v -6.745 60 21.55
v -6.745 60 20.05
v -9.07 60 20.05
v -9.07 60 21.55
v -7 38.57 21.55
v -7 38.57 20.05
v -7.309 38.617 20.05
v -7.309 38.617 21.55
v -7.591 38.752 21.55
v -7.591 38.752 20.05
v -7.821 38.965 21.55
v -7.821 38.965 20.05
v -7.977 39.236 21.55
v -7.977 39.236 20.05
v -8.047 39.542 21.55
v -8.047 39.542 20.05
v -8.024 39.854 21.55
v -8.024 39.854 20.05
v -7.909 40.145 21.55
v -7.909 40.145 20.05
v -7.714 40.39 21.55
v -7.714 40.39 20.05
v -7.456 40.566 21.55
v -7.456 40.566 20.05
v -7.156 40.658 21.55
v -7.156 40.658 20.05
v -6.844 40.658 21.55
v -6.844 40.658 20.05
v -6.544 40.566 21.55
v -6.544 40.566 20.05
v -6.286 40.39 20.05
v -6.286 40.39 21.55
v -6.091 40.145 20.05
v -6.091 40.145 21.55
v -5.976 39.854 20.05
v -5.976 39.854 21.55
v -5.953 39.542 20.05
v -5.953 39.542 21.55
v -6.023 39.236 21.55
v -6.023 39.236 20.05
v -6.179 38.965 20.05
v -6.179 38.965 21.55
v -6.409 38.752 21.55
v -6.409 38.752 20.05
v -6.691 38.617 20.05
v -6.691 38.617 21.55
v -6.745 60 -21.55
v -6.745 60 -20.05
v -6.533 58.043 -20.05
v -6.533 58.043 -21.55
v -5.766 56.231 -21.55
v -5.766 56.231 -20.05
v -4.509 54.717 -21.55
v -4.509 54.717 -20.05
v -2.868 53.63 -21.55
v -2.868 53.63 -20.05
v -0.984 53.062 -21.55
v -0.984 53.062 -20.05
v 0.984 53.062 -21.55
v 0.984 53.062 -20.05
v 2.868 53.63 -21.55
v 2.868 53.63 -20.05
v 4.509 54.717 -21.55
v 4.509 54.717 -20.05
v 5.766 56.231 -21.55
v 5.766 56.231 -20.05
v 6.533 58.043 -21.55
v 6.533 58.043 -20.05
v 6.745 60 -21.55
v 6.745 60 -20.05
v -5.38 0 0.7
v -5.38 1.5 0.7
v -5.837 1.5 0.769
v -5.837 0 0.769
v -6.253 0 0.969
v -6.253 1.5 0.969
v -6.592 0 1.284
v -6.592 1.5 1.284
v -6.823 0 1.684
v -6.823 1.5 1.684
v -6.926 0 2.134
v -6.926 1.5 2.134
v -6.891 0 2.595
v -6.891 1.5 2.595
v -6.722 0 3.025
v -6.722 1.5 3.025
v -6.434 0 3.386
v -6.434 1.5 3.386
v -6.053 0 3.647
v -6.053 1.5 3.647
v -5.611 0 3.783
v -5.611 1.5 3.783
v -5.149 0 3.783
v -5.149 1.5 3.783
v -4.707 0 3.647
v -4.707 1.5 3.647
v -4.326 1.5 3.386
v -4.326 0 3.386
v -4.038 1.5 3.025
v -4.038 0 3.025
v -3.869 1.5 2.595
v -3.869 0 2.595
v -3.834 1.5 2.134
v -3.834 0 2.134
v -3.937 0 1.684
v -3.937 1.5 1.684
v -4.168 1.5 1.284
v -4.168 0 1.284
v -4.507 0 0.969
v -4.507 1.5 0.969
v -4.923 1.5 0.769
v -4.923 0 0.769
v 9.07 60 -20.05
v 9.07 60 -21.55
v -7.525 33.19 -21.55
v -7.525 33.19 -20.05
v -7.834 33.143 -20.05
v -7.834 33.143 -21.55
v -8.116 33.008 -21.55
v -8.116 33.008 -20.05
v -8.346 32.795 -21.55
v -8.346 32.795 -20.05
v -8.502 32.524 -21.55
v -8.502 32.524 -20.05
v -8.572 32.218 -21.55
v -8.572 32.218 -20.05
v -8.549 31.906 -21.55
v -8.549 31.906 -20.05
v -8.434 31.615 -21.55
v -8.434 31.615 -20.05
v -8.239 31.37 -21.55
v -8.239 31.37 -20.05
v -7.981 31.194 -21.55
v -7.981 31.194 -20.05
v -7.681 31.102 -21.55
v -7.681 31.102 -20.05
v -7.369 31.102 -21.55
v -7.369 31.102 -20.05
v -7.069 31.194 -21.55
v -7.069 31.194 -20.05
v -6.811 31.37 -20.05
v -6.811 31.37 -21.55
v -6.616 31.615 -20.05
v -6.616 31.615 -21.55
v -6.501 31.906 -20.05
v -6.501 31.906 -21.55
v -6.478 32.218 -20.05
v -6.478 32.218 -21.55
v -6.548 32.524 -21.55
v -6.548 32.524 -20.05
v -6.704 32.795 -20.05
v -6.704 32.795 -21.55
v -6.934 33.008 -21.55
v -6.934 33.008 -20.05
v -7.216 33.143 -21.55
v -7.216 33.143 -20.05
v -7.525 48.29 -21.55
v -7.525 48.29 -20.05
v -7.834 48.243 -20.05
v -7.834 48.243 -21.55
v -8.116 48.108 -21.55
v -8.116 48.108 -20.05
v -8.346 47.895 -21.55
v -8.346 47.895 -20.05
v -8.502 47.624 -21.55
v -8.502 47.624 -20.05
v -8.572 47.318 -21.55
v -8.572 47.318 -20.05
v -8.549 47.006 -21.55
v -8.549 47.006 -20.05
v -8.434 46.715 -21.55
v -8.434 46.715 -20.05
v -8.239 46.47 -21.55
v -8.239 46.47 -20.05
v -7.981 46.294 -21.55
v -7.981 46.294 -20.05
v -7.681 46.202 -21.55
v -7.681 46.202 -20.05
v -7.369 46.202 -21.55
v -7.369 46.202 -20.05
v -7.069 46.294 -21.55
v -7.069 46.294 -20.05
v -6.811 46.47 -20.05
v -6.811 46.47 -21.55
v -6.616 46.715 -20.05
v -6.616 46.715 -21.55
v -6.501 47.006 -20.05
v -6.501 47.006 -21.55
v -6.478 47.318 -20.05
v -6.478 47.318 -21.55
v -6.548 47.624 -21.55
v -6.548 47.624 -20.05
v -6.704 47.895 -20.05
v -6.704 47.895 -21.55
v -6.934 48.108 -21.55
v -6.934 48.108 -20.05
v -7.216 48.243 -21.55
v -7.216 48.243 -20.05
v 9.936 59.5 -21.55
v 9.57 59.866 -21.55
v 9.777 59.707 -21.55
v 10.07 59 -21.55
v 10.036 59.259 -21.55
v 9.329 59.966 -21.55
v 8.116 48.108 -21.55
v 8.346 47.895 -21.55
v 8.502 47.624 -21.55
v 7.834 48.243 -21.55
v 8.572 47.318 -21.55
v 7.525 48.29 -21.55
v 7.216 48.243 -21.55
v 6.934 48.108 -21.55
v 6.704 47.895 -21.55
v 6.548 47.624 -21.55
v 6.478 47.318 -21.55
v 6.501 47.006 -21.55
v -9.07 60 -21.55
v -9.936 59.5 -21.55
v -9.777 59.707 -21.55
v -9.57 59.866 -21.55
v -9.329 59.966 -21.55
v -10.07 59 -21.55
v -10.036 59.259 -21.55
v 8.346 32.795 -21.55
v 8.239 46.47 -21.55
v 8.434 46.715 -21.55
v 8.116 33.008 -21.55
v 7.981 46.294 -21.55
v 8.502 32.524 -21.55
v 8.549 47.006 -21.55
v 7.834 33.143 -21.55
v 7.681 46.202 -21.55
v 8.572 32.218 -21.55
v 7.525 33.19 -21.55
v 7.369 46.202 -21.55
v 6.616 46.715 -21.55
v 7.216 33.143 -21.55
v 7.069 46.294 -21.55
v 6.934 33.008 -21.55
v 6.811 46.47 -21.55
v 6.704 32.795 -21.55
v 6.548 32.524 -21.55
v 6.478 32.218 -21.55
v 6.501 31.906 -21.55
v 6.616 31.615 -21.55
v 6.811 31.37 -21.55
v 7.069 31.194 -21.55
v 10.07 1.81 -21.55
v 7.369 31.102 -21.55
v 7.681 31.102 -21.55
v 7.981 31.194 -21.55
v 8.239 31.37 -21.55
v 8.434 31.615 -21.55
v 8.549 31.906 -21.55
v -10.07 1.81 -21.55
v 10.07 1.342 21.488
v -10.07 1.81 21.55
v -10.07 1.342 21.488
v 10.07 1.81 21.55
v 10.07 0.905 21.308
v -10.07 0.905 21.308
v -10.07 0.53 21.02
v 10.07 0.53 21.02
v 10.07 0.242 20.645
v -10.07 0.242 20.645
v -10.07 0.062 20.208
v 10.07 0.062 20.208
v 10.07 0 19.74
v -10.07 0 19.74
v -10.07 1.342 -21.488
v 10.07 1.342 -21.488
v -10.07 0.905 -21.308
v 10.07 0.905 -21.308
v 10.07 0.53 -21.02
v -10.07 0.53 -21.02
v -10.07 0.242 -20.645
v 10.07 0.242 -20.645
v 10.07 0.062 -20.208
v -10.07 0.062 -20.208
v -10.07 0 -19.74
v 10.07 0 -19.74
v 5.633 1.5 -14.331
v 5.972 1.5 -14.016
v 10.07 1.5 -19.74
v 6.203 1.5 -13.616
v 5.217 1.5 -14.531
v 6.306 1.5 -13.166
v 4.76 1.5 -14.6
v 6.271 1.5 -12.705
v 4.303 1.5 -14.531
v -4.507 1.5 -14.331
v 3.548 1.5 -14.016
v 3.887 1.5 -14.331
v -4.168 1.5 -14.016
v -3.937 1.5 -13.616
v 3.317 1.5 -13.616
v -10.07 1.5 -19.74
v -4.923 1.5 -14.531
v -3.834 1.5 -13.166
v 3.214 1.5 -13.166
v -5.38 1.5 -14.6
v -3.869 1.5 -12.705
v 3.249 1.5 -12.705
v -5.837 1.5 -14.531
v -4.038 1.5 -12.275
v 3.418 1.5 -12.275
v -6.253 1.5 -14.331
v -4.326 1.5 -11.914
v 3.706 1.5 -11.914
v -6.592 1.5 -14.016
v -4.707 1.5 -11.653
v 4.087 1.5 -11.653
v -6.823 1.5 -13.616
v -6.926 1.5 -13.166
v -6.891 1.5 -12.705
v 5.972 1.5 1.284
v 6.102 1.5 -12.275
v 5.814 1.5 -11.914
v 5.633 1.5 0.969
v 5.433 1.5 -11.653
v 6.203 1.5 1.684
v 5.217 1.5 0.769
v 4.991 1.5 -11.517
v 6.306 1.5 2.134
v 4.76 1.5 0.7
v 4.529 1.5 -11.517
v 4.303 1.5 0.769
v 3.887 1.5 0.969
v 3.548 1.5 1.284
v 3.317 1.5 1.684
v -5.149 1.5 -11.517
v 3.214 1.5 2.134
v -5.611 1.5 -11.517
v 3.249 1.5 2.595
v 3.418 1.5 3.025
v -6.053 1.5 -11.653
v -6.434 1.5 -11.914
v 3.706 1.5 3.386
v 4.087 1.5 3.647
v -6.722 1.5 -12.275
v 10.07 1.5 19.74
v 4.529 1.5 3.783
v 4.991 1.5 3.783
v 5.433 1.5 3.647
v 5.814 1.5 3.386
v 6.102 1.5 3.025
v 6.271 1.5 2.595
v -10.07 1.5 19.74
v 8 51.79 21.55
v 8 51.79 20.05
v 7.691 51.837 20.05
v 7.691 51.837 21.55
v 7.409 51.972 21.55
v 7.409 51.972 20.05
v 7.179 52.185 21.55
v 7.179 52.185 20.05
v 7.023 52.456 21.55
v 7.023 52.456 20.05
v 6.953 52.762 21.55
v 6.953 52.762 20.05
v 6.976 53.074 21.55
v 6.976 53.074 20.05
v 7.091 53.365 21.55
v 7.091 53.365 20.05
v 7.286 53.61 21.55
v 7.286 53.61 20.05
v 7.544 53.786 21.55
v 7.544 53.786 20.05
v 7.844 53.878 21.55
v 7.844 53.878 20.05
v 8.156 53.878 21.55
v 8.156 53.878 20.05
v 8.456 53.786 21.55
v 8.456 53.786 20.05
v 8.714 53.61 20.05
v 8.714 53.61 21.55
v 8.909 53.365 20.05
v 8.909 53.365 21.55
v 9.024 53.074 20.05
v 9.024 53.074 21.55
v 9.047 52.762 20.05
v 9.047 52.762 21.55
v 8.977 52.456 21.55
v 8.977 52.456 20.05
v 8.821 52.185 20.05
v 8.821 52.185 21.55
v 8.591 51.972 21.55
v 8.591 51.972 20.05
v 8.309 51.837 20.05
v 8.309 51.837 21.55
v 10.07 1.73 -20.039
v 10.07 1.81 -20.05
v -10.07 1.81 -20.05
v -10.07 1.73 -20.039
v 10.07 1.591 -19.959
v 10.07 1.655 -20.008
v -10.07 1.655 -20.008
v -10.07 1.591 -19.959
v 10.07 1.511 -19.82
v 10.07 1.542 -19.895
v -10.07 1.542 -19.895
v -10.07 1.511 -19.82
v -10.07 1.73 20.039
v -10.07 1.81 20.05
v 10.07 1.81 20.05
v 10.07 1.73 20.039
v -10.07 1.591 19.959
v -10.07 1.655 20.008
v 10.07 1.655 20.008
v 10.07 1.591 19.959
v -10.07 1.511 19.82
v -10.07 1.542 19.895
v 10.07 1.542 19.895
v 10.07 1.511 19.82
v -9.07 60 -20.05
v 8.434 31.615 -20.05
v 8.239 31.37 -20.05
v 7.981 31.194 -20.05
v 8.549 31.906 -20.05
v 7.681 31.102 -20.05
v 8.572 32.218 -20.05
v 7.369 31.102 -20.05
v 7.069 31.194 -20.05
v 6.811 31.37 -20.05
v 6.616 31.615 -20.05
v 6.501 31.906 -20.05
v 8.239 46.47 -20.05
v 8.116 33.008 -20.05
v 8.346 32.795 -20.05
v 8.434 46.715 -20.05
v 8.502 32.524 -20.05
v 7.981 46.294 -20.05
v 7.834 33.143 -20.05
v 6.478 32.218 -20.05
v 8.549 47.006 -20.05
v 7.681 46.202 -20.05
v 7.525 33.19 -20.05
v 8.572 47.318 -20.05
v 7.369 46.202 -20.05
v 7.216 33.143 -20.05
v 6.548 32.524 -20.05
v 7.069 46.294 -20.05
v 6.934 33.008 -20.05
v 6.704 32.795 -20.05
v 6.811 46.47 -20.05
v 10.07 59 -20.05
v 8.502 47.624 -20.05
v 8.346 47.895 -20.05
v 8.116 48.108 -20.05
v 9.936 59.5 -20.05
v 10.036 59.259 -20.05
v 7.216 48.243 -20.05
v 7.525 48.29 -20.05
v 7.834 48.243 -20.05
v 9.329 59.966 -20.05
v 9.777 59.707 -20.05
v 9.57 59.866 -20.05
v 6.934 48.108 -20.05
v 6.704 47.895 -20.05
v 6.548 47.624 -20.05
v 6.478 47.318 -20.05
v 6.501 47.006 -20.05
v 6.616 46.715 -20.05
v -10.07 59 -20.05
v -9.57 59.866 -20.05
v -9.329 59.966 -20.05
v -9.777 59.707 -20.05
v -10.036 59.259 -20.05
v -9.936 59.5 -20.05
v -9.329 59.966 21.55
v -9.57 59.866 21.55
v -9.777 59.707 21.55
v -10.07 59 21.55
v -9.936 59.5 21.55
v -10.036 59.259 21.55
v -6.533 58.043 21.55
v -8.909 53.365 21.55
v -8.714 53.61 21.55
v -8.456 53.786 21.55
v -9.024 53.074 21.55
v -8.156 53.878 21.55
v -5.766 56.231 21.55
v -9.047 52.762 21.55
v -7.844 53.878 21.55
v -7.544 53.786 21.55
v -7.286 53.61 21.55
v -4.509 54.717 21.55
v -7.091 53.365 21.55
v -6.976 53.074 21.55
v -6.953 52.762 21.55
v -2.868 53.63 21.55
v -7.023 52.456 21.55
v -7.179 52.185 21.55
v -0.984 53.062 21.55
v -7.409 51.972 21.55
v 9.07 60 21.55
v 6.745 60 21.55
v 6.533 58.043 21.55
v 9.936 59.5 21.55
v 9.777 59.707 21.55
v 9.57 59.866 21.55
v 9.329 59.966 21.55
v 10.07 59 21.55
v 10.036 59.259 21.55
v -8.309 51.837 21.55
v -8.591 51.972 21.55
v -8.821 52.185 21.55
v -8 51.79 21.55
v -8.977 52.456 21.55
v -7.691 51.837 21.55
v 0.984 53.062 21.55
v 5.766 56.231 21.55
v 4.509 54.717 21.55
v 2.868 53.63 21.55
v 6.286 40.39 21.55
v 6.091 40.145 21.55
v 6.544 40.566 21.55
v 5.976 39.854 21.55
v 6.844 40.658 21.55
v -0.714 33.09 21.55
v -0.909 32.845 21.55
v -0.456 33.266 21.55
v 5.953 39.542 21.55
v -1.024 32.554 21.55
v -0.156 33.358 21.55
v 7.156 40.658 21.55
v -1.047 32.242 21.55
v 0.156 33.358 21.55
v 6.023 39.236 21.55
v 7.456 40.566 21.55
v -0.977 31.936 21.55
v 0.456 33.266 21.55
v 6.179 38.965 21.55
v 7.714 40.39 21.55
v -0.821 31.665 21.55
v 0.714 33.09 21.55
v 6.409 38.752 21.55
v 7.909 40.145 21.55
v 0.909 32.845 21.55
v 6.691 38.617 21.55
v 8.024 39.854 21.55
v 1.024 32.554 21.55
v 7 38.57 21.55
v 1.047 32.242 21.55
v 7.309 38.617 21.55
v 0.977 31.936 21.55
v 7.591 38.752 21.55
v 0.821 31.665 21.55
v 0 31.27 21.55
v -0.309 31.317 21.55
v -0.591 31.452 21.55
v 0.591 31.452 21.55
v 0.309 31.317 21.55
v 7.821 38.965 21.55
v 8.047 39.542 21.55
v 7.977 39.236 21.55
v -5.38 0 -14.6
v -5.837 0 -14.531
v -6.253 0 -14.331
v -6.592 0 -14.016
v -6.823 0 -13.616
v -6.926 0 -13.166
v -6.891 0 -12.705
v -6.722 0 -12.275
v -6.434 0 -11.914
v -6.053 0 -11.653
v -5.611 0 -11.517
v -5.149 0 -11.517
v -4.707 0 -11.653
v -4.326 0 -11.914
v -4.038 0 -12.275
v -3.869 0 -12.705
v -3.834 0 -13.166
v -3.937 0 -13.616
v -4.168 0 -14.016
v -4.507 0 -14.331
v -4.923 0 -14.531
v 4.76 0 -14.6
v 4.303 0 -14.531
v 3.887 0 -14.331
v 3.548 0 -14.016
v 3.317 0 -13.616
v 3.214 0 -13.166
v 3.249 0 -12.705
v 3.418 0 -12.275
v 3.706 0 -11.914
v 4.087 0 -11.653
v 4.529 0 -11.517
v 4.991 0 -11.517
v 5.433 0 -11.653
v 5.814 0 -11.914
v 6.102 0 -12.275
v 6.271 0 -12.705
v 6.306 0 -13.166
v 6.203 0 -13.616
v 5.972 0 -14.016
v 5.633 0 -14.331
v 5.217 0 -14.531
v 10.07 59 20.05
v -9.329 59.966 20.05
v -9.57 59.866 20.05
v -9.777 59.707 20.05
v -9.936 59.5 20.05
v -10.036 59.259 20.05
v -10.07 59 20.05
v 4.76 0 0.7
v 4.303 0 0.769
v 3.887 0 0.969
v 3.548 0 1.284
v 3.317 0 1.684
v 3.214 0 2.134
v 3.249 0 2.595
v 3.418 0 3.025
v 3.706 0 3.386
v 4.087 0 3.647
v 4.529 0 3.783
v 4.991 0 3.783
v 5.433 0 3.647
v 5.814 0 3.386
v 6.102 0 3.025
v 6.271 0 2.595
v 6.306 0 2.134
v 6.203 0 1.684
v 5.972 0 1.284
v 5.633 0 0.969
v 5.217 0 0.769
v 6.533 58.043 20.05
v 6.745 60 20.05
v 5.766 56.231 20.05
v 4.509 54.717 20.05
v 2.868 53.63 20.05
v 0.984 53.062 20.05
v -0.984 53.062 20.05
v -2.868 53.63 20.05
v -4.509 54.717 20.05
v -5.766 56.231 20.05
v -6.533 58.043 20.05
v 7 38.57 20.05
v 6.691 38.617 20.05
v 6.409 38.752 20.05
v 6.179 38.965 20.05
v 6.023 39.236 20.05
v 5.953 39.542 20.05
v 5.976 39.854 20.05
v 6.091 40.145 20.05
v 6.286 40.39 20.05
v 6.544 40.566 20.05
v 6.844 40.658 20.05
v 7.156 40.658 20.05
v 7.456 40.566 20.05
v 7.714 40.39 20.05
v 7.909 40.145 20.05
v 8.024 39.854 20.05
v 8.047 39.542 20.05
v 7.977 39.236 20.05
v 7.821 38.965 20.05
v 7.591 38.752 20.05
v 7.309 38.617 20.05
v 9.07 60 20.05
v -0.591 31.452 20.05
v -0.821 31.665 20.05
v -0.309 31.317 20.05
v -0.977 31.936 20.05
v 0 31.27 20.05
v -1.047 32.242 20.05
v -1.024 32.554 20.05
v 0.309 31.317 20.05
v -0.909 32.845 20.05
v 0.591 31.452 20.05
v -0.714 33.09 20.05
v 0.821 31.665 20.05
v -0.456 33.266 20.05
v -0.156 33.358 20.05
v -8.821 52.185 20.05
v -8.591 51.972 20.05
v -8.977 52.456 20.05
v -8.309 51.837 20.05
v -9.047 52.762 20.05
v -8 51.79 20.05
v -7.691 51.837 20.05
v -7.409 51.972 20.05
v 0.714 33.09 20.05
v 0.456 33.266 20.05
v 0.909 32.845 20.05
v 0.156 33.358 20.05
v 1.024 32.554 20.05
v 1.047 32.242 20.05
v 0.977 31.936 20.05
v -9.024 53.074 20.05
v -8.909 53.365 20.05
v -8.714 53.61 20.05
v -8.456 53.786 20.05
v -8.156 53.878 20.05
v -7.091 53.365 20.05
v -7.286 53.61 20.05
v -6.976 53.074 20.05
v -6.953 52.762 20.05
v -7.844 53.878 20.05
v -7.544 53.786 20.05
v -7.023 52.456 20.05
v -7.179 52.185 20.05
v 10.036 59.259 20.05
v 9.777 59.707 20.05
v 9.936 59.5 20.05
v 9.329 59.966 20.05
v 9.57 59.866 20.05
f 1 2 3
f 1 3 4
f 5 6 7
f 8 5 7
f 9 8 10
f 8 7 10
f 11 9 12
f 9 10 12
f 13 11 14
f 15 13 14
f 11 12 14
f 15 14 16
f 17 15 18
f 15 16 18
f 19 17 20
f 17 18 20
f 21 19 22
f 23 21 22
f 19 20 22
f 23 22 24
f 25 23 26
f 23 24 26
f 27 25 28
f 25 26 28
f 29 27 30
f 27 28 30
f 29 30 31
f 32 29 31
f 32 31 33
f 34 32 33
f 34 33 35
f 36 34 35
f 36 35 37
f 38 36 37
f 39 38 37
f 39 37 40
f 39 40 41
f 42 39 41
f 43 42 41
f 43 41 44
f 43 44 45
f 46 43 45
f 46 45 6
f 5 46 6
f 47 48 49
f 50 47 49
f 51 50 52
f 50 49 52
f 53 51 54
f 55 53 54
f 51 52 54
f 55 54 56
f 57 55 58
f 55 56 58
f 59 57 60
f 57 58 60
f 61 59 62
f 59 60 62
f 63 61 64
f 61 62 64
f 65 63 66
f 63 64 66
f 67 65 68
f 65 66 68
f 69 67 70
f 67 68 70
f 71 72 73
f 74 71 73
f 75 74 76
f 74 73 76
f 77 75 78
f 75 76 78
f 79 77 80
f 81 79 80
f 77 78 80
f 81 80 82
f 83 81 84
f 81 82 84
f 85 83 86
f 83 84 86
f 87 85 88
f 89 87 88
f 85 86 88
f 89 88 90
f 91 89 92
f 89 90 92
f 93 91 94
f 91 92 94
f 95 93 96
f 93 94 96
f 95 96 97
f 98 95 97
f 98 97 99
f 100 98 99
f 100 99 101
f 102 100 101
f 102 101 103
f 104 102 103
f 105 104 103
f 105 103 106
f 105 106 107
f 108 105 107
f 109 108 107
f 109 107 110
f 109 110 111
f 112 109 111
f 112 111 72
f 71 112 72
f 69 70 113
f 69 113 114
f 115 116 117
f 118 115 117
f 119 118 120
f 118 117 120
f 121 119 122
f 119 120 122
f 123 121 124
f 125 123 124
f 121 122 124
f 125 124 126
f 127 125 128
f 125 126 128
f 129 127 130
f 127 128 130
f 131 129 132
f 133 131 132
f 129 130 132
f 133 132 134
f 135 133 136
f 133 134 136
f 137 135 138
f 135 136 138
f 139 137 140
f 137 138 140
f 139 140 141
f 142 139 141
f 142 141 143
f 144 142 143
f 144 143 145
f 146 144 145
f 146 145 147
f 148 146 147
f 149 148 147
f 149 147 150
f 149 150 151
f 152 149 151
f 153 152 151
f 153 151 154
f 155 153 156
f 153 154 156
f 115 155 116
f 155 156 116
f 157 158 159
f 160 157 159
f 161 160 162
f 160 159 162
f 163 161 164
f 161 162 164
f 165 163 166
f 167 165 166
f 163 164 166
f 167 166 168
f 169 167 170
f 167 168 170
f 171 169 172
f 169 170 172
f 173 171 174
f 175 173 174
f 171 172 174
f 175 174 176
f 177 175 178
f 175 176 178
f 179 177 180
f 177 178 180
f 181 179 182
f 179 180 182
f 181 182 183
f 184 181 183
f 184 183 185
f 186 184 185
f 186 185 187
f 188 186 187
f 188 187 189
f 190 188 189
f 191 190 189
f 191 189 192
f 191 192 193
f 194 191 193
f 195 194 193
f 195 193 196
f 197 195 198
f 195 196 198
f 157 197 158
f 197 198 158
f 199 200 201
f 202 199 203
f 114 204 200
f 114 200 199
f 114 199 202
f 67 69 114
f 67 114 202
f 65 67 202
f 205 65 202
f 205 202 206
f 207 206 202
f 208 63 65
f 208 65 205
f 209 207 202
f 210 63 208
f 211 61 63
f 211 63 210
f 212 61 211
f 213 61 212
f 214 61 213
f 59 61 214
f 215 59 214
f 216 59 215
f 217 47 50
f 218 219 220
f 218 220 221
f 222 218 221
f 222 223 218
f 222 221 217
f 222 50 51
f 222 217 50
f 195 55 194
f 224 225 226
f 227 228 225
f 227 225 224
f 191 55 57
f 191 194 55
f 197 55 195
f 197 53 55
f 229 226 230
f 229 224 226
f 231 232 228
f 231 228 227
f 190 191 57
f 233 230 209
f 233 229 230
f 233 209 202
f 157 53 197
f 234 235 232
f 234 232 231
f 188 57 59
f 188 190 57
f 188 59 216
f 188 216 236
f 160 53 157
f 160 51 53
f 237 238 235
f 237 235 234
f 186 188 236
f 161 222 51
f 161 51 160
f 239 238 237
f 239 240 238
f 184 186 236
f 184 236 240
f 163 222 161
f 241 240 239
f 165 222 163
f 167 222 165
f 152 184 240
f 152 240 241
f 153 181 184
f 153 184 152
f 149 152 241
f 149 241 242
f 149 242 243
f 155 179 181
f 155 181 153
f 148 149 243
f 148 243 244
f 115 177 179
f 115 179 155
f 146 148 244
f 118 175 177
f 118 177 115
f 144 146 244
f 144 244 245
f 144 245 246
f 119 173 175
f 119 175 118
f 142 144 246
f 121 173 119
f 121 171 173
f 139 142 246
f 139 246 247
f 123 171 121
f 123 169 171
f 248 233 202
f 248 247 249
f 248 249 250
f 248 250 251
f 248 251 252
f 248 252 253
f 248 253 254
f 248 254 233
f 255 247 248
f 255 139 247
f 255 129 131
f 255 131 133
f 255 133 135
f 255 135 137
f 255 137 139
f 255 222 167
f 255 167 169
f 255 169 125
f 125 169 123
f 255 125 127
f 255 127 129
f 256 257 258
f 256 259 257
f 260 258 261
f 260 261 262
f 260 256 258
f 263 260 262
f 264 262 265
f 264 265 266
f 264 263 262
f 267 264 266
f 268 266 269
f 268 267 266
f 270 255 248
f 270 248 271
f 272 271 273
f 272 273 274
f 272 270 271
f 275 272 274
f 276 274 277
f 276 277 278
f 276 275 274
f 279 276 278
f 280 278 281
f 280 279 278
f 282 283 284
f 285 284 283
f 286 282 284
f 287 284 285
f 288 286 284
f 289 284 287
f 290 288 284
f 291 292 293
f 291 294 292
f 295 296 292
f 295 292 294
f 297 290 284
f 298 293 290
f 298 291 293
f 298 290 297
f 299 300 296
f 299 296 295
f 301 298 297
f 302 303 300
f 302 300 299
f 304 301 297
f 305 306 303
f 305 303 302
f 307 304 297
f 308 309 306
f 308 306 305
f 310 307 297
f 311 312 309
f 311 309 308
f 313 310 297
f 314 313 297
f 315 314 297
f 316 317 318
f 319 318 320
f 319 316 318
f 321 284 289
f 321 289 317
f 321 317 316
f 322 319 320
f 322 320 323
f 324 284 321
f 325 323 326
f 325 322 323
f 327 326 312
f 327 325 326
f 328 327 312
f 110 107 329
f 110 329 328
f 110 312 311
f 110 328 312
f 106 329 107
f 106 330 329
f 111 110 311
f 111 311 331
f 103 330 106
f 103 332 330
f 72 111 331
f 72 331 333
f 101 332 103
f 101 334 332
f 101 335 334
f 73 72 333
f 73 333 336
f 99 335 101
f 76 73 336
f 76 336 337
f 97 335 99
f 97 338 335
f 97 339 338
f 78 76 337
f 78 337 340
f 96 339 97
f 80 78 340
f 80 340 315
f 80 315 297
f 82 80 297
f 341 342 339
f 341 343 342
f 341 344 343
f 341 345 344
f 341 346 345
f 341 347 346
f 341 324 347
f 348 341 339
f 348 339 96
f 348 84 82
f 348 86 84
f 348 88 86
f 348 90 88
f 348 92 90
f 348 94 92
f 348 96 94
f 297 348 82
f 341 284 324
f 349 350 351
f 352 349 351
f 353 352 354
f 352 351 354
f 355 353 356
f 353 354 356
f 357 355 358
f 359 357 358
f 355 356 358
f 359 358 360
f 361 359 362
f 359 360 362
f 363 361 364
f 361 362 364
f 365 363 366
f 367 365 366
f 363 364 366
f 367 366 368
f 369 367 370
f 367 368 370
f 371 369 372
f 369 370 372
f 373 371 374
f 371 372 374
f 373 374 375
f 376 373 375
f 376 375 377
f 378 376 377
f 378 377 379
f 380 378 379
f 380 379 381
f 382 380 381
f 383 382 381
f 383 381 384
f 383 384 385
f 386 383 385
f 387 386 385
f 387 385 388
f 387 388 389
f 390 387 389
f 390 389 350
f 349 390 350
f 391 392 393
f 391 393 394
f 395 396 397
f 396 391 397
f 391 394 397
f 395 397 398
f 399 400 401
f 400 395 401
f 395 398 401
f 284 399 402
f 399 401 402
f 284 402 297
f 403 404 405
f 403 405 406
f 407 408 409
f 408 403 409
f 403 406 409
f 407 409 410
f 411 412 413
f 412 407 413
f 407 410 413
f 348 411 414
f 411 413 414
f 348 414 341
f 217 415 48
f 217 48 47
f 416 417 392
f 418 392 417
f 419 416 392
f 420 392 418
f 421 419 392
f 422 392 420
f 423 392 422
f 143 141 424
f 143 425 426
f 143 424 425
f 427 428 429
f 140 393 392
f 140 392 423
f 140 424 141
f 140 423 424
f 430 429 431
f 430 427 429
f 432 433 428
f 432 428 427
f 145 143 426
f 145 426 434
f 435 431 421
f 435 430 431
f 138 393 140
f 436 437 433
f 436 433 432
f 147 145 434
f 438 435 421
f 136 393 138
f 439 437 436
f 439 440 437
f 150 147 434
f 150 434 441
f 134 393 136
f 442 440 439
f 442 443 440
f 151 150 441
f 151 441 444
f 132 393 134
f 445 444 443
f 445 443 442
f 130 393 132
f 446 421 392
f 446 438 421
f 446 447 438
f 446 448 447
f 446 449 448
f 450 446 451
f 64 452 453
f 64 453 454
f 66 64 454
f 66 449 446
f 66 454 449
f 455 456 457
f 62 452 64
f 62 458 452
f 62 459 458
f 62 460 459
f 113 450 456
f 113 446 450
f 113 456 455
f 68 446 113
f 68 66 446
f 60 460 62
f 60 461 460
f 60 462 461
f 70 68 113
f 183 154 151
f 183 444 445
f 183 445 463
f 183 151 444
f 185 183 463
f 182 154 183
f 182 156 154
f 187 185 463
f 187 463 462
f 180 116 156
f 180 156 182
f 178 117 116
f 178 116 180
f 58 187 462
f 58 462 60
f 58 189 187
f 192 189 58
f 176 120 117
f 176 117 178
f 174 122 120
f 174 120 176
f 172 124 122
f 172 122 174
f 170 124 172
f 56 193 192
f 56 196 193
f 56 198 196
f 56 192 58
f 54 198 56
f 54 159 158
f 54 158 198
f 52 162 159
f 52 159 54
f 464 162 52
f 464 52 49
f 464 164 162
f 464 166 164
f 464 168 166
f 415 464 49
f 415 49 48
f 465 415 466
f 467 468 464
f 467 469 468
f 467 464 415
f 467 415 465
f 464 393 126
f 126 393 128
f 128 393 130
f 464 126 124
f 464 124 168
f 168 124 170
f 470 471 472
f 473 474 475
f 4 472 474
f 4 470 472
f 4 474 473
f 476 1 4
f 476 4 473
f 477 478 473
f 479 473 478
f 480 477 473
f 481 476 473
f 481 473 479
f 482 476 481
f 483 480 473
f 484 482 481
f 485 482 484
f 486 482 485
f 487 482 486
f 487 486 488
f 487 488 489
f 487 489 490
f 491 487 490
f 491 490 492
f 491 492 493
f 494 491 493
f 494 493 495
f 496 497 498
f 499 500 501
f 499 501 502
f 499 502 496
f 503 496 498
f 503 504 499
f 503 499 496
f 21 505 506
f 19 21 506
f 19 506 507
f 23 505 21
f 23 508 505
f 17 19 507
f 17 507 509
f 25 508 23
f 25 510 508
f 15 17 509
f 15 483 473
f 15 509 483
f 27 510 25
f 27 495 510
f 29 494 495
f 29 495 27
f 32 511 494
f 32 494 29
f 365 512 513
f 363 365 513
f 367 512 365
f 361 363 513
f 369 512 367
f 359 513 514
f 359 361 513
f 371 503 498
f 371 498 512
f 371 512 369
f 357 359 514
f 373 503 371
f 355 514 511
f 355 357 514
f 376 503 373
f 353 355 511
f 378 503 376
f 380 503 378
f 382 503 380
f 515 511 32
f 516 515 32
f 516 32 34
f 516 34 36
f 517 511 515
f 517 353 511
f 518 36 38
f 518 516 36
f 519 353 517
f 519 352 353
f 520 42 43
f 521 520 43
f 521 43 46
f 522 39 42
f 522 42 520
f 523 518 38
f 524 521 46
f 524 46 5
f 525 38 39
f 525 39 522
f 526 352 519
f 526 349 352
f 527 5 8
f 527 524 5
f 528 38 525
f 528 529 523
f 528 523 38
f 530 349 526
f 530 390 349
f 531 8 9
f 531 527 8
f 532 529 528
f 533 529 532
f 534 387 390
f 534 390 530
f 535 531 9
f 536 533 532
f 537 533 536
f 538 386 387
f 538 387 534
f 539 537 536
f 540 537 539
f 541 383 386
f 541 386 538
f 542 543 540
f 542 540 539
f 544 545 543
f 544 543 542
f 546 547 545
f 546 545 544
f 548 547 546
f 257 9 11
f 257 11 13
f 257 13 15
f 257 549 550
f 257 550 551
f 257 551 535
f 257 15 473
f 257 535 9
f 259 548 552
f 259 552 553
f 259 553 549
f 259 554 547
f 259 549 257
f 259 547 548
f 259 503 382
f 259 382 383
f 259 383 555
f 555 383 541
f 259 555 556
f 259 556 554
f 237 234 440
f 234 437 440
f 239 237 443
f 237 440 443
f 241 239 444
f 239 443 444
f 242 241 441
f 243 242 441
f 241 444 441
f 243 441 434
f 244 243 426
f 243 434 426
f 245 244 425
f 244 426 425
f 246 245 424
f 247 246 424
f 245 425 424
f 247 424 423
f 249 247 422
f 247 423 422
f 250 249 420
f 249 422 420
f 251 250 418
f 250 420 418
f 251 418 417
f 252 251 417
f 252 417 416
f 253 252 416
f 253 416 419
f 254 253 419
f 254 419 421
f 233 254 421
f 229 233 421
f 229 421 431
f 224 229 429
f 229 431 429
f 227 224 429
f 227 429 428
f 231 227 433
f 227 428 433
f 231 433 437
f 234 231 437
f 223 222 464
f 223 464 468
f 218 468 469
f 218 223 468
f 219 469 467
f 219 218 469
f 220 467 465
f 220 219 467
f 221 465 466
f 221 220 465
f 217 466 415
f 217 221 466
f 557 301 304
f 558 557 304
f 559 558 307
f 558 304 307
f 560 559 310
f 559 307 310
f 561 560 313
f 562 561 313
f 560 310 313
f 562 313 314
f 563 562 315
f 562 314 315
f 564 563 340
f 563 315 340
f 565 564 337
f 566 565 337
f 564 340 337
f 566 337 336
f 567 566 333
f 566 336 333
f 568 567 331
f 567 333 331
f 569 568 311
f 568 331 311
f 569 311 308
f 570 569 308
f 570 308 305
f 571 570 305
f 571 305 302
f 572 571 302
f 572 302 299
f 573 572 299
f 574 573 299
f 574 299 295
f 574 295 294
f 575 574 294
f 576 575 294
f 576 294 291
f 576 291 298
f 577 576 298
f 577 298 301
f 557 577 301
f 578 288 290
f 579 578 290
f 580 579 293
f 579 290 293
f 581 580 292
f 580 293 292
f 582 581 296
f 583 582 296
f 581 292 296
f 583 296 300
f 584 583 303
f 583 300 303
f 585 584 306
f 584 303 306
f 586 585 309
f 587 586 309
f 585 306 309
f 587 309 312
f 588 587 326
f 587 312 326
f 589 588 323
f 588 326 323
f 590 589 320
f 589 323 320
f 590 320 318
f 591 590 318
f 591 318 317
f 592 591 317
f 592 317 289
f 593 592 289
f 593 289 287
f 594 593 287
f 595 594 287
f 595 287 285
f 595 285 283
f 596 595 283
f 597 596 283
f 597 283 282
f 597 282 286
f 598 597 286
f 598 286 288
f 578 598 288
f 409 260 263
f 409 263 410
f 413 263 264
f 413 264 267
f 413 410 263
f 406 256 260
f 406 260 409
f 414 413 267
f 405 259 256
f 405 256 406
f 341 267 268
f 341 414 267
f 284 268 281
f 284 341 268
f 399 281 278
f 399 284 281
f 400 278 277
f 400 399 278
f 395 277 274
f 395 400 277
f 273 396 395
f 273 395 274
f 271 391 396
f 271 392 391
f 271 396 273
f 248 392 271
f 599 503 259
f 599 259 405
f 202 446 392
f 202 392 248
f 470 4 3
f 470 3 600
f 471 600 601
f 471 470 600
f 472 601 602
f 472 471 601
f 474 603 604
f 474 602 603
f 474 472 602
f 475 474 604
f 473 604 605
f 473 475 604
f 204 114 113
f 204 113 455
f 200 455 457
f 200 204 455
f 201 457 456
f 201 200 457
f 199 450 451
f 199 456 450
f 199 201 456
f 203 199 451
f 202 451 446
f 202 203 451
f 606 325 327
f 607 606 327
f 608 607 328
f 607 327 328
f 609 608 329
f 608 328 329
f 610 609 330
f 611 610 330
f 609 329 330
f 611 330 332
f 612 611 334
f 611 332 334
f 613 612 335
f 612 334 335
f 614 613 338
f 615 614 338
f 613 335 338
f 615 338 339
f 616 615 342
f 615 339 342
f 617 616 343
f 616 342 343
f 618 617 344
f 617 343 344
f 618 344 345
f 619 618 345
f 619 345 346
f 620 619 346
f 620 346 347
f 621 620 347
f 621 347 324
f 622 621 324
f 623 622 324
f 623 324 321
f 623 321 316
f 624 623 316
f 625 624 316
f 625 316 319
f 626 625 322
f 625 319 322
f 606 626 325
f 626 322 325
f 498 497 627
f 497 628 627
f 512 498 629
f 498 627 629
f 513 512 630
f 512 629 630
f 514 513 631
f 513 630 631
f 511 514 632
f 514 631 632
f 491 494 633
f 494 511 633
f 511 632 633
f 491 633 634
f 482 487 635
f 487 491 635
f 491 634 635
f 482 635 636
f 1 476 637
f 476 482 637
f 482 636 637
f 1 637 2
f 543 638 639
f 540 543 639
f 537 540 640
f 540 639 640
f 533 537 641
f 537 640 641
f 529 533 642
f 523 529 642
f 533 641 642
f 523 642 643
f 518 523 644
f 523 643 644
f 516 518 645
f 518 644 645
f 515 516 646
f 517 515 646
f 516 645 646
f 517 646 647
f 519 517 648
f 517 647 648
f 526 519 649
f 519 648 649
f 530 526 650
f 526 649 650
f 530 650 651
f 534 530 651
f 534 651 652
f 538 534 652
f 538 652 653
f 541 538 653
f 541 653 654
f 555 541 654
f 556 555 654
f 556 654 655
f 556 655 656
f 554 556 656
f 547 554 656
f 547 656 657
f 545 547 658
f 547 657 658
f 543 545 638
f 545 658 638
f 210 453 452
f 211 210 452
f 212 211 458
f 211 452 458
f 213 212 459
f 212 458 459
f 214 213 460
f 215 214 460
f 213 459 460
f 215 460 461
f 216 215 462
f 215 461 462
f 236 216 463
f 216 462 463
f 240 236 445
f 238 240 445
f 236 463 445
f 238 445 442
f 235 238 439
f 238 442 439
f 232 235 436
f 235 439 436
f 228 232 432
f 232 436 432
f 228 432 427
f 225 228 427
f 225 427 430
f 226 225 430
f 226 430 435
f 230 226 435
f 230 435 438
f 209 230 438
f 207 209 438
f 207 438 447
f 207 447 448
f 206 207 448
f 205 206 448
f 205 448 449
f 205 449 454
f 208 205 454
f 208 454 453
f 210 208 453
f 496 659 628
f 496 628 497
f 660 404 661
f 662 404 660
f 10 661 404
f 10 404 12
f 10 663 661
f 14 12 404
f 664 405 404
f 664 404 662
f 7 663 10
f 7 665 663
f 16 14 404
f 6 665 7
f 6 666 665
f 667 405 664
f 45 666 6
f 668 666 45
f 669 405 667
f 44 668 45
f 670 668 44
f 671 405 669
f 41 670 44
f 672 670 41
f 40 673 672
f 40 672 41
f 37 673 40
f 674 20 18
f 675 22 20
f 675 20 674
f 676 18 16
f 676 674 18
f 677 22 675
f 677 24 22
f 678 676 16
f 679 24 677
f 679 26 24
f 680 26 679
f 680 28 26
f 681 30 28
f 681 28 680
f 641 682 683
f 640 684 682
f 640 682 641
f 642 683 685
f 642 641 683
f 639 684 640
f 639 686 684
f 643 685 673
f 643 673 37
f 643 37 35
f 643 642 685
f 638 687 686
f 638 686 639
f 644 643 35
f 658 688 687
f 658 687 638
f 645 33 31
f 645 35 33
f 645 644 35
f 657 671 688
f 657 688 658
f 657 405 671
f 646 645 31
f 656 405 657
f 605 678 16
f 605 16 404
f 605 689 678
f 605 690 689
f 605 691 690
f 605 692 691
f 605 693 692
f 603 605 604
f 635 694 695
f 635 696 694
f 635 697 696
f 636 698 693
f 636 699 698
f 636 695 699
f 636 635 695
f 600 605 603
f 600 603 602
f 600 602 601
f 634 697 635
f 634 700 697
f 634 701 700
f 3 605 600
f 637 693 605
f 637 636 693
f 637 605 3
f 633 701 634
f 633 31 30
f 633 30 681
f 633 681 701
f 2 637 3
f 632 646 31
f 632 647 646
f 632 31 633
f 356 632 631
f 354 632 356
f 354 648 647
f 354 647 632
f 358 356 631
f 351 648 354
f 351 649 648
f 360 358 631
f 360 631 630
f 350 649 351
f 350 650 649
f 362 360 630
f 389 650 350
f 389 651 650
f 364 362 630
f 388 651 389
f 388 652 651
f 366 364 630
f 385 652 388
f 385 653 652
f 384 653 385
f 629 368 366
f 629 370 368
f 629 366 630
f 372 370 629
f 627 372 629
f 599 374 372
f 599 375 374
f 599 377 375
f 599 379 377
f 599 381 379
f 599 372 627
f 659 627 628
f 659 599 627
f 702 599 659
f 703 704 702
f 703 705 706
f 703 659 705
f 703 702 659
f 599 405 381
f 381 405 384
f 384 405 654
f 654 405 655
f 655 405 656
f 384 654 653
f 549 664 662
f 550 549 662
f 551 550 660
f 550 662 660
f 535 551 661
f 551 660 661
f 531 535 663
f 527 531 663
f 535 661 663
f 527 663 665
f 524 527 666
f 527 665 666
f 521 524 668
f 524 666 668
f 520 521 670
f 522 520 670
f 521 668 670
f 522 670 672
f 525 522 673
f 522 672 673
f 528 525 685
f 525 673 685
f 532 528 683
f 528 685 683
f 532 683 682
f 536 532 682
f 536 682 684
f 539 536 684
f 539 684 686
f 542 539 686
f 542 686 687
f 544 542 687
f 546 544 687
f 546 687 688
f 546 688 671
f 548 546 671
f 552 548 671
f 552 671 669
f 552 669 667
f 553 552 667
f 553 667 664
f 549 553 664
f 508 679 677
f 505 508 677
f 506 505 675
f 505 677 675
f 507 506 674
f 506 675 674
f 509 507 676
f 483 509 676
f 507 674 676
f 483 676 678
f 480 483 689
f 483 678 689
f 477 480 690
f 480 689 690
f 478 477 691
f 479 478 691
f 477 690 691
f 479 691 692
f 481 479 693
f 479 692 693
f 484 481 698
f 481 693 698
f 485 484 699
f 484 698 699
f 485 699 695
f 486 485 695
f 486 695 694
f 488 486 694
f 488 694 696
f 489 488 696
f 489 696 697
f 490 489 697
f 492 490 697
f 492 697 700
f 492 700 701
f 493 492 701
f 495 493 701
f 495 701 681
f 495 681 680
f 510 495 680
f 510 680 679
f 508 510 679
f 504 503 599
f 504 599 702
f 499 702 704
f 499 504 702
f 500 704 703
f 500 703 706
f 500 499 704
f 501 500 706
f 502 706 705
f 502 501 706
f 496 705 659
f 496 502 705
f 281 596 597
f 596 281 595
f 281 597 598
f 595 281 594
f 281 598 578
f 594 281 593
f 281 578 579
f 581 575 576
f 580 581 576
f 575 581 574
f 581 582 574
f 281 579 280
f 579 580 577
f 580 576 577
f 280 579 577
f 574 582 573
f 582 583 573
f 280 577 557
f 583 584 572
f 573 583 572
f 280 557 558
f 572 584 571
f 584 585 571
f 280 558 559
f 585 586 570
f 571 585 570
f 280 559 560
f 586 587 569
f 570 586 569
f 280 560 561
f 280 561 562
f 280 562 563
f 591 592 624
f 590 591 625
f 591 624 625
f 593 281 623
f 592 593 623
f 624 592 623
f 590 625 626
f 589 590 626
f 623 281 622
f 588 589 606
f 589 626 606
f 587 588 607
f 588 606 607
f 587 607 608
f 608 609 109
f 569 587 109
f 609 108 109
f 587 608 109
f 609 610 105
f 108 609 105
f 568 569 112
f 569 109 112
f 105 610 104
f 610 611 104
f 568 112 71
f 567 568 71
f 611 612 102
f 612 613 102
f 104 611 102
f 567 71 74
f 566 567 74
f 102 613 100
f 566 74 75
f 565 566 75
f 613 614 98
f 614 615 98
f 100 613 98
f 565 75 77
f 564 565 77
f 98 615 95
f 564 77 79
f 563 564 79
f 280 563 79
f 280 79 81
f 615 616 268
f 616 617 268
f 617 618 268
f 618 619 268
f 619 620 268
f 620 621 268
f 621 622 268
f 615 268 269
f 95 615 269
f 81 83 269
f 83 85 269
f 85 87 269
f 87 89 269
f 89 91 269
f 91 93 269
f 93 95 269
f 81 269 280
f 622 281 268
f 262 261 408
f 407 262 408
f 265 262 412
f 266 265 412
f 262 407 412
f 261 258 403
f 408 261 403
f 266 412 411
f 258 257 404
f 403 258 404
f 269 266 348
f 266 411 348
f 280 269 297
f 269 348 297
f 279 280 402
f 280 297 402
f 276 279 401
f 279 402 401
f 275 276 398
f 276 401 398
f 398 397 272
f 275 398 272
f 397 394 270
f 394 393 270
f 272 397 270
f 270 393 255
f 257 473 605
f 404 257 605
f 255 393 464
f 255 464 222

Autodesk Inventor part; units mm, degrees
ref_plane "YZ Plane" through (0, 0, 0) normal (1, 0, 0) x (0, 1, 0)
ref_plane "XZ Plane" through (0, 0, 0) normal (0, 1, 0) x (-1, 0, 0)
ref_plane "XY Plane" through (0, 0, 0) normal (0, 0, 1) x (1, 0, 0)
sketch "Sketch1" plane through (0, 0, 0) normal (0, 1, 0) x (-1, 0, 0)
  line L0 (10.07, 20.05) -> (-10.07, 20.05)
  line L1 (-10.07, 20.05) -> (-10.07, -20.05)
  line L2 (-10.07, -20.05) -> (10.07, -20.05)
  line L3 (10.07, -20.05) -> (10.07, 20.05)
  point P0 (0, 0)
  dimension "d0" = 40.1
  dimension "d1" = 20.14
  dimension "d2" = 10.07
  dimension "d3" = 20.05
extrude "Plate1" add sketch "Sketch1" along normal blind 1.5
sketch "Sketch2" plane through (10.07, 0, 21.55) normal (0, 0, -1) x (-1, 0, 0)
  line L0 (20.14, 0) -> (0, 0)
  line L1 (0, 0) -> (0, 60)
  line L2 (0, 60) -> (20.14, 60)
  line L3 (20.14, 60) -> (20.14, 0)
edge flange "Flange1" height 60 angle 90 thickness 1.5 bend radius 0.31 thickness toward (0, 0, -1) relief tear relief width 1.5 relief depth 0.75 corner gap 0.31 corner form 0 edges at (0, 1.5, 20.05) (0, 1.5, -20.05) wall of the first edge with corners at (-10.07, 0, 21.55) (10.07, 0, 21.55) (10.07, 60, 21.55) (-10.07, 60, 21.55)
bend "Bend1"
corner "Corner1"
sketch "Sketch15" plane through (10.07, 60, -21.55) normal (0, 0, -1) x (-1, 0, 0)
  circle A0 centre (2.545, -12.76) radius 0.7835
  circle A1 centre (17.595, -12.76) radius 0.7835
  circle A2 centre (2.545, -27.86) radius 0.7835
  circle A3 centre (17.595, -27.86) radius 0.7835
  point P0 (10.07, -60)
hole "Hole9" at (7.525, 47.24, -21.55) at (-7.525, 47.24, -21.55) at (7.525, 32.14, -21.55) at (-7.525, 32.14, -21.55) direction (0, 0, 1) diameter 2.1 depth 1.5
sketch "Sketch16" plane through (-10.07, 60, 21.55) normal (0, 0, 1) x (1, 0, 0)
  circle A0 centre (18.07, -7.16) radius 0.7835
  circle A1 centre (2.07, -7.16) radius 0.7835
  circle A2 centre (3.07, -20.38) radius 0.7835
  circle A3 centre (17.07, -20.38) radius 0.7835
  circle A4 centre (10.07, -27.68) radius 0.7835
  point P0 (10.07, -60)
hole "Hole10" at (-8, 52.84, 21.55) at (8, 52.84, 21.55) at (-7, 39.62, 21.55) at (7, 39.62, 21.55) at (0, 32.32, 21.55) direction (0, 0, -1) diameter 2.1 depth 1.5
sketch "Sketch17" plane through (-10.07, 60, 21.55) normal (0, 0, 1) x (1, 0, 0)
  point P0 (10.07, -60)
sketch "Sketch18" plane through (-10.07, 60, 21.55) normal (0, 0, 1) x (1, 0, 0)
  point P0 (10.07, -60)
sketch "Sketch19" plane through (-10.07, 60, 21.55) normal (0, 0, 1) x (1, 0, 0)
  circle A0 centre (10.07, -0.26) radius 6
  point P0 (10.07, -60)
sketch "Sketch20" plane through (10.07, 60, -21.55) normal (0, 0, -1) x (-1, 0, 0)
  circle A0 centre (10.07, -0.26) radius 6
  point P0 (10.07, -60)
sketch "Sketch21" plane through (0, 0, 0) normal (0, -1, 0) x (1, 0, 0)
  circle A0 centre (4.76, 2.25) radius 1.5
  circle A1 centre (4.76, -13.05) radius 1.5
  circle A2 centre (-5.38, -13.05) radius 1.5
  circle A3 centre (-5.38, 2.25) radius 1.5
  point P0 (0, 0)
fillet "Corner Round1" radius 1 4 edges at (-10.07, 60, 20.8) (-10.07, 60, -20.8) (10.07, 60, -20.8) (10.07, 60, 20.8)
hole "Hole11" at (-5.38, 0, -13.05) at (4.76, 0, -13.05) at (-5.38, 0, 2.25) at (4.76, 0, 2.25) direction (0, 1, 0) diameter 3.1 depth 1.5
hole "Hole12" at (0, 59.74, 21.55) direction (0, 0, -1) diameter 13.5 depth 1.5
hole "Hole13" at (0, 59.74, -21.55) direction (0, 0, 1) diameter 13.5 depth 1.5
equation "\"d96\" = Thickness"
equation "\"d103\" = Thickness"
equation "\"d117\" = Thickness"
equation "\"d124\" = Thickness"
equation "\"d131\" = Thickness"
equation "\"d4\" = Thickness"
equation "\"d5\" = BendReliefWidth"
equation "\"d6\" = BendReliefDepth"
equation "\"d7\" = MinimumRemnant"
equation "\"d8\" = TransitionRadius"
equation "\"d11\" = BendRadius"
equation "\"d12\" = CornerReliefSize"
equation "\"d13\" = GapSize"
equation "\"d14\" = JacobiRadiusSize"
equation "\"BendReliefWidth\" = Thickness"
equation "\"BendReliefDepth\" = 0.5 * Thickness"
equation "\"CornerReliefSize\" = 4 * Thickness"
equation "\"MinimumRemnant\" = 2 * Thickness"
equation "\"TransitionRadius\" = BendRadius"
equation "\"JacobiRadiusSize\" = BendRadius"
equation "\"GapSize\" = Thickness"
equation "\"Thickness\" = 1.5"
equation "\"BendRadius\" = 0.31"
properties part number "axis_25_top_frame" material "Aluminum 6061-AHC"
